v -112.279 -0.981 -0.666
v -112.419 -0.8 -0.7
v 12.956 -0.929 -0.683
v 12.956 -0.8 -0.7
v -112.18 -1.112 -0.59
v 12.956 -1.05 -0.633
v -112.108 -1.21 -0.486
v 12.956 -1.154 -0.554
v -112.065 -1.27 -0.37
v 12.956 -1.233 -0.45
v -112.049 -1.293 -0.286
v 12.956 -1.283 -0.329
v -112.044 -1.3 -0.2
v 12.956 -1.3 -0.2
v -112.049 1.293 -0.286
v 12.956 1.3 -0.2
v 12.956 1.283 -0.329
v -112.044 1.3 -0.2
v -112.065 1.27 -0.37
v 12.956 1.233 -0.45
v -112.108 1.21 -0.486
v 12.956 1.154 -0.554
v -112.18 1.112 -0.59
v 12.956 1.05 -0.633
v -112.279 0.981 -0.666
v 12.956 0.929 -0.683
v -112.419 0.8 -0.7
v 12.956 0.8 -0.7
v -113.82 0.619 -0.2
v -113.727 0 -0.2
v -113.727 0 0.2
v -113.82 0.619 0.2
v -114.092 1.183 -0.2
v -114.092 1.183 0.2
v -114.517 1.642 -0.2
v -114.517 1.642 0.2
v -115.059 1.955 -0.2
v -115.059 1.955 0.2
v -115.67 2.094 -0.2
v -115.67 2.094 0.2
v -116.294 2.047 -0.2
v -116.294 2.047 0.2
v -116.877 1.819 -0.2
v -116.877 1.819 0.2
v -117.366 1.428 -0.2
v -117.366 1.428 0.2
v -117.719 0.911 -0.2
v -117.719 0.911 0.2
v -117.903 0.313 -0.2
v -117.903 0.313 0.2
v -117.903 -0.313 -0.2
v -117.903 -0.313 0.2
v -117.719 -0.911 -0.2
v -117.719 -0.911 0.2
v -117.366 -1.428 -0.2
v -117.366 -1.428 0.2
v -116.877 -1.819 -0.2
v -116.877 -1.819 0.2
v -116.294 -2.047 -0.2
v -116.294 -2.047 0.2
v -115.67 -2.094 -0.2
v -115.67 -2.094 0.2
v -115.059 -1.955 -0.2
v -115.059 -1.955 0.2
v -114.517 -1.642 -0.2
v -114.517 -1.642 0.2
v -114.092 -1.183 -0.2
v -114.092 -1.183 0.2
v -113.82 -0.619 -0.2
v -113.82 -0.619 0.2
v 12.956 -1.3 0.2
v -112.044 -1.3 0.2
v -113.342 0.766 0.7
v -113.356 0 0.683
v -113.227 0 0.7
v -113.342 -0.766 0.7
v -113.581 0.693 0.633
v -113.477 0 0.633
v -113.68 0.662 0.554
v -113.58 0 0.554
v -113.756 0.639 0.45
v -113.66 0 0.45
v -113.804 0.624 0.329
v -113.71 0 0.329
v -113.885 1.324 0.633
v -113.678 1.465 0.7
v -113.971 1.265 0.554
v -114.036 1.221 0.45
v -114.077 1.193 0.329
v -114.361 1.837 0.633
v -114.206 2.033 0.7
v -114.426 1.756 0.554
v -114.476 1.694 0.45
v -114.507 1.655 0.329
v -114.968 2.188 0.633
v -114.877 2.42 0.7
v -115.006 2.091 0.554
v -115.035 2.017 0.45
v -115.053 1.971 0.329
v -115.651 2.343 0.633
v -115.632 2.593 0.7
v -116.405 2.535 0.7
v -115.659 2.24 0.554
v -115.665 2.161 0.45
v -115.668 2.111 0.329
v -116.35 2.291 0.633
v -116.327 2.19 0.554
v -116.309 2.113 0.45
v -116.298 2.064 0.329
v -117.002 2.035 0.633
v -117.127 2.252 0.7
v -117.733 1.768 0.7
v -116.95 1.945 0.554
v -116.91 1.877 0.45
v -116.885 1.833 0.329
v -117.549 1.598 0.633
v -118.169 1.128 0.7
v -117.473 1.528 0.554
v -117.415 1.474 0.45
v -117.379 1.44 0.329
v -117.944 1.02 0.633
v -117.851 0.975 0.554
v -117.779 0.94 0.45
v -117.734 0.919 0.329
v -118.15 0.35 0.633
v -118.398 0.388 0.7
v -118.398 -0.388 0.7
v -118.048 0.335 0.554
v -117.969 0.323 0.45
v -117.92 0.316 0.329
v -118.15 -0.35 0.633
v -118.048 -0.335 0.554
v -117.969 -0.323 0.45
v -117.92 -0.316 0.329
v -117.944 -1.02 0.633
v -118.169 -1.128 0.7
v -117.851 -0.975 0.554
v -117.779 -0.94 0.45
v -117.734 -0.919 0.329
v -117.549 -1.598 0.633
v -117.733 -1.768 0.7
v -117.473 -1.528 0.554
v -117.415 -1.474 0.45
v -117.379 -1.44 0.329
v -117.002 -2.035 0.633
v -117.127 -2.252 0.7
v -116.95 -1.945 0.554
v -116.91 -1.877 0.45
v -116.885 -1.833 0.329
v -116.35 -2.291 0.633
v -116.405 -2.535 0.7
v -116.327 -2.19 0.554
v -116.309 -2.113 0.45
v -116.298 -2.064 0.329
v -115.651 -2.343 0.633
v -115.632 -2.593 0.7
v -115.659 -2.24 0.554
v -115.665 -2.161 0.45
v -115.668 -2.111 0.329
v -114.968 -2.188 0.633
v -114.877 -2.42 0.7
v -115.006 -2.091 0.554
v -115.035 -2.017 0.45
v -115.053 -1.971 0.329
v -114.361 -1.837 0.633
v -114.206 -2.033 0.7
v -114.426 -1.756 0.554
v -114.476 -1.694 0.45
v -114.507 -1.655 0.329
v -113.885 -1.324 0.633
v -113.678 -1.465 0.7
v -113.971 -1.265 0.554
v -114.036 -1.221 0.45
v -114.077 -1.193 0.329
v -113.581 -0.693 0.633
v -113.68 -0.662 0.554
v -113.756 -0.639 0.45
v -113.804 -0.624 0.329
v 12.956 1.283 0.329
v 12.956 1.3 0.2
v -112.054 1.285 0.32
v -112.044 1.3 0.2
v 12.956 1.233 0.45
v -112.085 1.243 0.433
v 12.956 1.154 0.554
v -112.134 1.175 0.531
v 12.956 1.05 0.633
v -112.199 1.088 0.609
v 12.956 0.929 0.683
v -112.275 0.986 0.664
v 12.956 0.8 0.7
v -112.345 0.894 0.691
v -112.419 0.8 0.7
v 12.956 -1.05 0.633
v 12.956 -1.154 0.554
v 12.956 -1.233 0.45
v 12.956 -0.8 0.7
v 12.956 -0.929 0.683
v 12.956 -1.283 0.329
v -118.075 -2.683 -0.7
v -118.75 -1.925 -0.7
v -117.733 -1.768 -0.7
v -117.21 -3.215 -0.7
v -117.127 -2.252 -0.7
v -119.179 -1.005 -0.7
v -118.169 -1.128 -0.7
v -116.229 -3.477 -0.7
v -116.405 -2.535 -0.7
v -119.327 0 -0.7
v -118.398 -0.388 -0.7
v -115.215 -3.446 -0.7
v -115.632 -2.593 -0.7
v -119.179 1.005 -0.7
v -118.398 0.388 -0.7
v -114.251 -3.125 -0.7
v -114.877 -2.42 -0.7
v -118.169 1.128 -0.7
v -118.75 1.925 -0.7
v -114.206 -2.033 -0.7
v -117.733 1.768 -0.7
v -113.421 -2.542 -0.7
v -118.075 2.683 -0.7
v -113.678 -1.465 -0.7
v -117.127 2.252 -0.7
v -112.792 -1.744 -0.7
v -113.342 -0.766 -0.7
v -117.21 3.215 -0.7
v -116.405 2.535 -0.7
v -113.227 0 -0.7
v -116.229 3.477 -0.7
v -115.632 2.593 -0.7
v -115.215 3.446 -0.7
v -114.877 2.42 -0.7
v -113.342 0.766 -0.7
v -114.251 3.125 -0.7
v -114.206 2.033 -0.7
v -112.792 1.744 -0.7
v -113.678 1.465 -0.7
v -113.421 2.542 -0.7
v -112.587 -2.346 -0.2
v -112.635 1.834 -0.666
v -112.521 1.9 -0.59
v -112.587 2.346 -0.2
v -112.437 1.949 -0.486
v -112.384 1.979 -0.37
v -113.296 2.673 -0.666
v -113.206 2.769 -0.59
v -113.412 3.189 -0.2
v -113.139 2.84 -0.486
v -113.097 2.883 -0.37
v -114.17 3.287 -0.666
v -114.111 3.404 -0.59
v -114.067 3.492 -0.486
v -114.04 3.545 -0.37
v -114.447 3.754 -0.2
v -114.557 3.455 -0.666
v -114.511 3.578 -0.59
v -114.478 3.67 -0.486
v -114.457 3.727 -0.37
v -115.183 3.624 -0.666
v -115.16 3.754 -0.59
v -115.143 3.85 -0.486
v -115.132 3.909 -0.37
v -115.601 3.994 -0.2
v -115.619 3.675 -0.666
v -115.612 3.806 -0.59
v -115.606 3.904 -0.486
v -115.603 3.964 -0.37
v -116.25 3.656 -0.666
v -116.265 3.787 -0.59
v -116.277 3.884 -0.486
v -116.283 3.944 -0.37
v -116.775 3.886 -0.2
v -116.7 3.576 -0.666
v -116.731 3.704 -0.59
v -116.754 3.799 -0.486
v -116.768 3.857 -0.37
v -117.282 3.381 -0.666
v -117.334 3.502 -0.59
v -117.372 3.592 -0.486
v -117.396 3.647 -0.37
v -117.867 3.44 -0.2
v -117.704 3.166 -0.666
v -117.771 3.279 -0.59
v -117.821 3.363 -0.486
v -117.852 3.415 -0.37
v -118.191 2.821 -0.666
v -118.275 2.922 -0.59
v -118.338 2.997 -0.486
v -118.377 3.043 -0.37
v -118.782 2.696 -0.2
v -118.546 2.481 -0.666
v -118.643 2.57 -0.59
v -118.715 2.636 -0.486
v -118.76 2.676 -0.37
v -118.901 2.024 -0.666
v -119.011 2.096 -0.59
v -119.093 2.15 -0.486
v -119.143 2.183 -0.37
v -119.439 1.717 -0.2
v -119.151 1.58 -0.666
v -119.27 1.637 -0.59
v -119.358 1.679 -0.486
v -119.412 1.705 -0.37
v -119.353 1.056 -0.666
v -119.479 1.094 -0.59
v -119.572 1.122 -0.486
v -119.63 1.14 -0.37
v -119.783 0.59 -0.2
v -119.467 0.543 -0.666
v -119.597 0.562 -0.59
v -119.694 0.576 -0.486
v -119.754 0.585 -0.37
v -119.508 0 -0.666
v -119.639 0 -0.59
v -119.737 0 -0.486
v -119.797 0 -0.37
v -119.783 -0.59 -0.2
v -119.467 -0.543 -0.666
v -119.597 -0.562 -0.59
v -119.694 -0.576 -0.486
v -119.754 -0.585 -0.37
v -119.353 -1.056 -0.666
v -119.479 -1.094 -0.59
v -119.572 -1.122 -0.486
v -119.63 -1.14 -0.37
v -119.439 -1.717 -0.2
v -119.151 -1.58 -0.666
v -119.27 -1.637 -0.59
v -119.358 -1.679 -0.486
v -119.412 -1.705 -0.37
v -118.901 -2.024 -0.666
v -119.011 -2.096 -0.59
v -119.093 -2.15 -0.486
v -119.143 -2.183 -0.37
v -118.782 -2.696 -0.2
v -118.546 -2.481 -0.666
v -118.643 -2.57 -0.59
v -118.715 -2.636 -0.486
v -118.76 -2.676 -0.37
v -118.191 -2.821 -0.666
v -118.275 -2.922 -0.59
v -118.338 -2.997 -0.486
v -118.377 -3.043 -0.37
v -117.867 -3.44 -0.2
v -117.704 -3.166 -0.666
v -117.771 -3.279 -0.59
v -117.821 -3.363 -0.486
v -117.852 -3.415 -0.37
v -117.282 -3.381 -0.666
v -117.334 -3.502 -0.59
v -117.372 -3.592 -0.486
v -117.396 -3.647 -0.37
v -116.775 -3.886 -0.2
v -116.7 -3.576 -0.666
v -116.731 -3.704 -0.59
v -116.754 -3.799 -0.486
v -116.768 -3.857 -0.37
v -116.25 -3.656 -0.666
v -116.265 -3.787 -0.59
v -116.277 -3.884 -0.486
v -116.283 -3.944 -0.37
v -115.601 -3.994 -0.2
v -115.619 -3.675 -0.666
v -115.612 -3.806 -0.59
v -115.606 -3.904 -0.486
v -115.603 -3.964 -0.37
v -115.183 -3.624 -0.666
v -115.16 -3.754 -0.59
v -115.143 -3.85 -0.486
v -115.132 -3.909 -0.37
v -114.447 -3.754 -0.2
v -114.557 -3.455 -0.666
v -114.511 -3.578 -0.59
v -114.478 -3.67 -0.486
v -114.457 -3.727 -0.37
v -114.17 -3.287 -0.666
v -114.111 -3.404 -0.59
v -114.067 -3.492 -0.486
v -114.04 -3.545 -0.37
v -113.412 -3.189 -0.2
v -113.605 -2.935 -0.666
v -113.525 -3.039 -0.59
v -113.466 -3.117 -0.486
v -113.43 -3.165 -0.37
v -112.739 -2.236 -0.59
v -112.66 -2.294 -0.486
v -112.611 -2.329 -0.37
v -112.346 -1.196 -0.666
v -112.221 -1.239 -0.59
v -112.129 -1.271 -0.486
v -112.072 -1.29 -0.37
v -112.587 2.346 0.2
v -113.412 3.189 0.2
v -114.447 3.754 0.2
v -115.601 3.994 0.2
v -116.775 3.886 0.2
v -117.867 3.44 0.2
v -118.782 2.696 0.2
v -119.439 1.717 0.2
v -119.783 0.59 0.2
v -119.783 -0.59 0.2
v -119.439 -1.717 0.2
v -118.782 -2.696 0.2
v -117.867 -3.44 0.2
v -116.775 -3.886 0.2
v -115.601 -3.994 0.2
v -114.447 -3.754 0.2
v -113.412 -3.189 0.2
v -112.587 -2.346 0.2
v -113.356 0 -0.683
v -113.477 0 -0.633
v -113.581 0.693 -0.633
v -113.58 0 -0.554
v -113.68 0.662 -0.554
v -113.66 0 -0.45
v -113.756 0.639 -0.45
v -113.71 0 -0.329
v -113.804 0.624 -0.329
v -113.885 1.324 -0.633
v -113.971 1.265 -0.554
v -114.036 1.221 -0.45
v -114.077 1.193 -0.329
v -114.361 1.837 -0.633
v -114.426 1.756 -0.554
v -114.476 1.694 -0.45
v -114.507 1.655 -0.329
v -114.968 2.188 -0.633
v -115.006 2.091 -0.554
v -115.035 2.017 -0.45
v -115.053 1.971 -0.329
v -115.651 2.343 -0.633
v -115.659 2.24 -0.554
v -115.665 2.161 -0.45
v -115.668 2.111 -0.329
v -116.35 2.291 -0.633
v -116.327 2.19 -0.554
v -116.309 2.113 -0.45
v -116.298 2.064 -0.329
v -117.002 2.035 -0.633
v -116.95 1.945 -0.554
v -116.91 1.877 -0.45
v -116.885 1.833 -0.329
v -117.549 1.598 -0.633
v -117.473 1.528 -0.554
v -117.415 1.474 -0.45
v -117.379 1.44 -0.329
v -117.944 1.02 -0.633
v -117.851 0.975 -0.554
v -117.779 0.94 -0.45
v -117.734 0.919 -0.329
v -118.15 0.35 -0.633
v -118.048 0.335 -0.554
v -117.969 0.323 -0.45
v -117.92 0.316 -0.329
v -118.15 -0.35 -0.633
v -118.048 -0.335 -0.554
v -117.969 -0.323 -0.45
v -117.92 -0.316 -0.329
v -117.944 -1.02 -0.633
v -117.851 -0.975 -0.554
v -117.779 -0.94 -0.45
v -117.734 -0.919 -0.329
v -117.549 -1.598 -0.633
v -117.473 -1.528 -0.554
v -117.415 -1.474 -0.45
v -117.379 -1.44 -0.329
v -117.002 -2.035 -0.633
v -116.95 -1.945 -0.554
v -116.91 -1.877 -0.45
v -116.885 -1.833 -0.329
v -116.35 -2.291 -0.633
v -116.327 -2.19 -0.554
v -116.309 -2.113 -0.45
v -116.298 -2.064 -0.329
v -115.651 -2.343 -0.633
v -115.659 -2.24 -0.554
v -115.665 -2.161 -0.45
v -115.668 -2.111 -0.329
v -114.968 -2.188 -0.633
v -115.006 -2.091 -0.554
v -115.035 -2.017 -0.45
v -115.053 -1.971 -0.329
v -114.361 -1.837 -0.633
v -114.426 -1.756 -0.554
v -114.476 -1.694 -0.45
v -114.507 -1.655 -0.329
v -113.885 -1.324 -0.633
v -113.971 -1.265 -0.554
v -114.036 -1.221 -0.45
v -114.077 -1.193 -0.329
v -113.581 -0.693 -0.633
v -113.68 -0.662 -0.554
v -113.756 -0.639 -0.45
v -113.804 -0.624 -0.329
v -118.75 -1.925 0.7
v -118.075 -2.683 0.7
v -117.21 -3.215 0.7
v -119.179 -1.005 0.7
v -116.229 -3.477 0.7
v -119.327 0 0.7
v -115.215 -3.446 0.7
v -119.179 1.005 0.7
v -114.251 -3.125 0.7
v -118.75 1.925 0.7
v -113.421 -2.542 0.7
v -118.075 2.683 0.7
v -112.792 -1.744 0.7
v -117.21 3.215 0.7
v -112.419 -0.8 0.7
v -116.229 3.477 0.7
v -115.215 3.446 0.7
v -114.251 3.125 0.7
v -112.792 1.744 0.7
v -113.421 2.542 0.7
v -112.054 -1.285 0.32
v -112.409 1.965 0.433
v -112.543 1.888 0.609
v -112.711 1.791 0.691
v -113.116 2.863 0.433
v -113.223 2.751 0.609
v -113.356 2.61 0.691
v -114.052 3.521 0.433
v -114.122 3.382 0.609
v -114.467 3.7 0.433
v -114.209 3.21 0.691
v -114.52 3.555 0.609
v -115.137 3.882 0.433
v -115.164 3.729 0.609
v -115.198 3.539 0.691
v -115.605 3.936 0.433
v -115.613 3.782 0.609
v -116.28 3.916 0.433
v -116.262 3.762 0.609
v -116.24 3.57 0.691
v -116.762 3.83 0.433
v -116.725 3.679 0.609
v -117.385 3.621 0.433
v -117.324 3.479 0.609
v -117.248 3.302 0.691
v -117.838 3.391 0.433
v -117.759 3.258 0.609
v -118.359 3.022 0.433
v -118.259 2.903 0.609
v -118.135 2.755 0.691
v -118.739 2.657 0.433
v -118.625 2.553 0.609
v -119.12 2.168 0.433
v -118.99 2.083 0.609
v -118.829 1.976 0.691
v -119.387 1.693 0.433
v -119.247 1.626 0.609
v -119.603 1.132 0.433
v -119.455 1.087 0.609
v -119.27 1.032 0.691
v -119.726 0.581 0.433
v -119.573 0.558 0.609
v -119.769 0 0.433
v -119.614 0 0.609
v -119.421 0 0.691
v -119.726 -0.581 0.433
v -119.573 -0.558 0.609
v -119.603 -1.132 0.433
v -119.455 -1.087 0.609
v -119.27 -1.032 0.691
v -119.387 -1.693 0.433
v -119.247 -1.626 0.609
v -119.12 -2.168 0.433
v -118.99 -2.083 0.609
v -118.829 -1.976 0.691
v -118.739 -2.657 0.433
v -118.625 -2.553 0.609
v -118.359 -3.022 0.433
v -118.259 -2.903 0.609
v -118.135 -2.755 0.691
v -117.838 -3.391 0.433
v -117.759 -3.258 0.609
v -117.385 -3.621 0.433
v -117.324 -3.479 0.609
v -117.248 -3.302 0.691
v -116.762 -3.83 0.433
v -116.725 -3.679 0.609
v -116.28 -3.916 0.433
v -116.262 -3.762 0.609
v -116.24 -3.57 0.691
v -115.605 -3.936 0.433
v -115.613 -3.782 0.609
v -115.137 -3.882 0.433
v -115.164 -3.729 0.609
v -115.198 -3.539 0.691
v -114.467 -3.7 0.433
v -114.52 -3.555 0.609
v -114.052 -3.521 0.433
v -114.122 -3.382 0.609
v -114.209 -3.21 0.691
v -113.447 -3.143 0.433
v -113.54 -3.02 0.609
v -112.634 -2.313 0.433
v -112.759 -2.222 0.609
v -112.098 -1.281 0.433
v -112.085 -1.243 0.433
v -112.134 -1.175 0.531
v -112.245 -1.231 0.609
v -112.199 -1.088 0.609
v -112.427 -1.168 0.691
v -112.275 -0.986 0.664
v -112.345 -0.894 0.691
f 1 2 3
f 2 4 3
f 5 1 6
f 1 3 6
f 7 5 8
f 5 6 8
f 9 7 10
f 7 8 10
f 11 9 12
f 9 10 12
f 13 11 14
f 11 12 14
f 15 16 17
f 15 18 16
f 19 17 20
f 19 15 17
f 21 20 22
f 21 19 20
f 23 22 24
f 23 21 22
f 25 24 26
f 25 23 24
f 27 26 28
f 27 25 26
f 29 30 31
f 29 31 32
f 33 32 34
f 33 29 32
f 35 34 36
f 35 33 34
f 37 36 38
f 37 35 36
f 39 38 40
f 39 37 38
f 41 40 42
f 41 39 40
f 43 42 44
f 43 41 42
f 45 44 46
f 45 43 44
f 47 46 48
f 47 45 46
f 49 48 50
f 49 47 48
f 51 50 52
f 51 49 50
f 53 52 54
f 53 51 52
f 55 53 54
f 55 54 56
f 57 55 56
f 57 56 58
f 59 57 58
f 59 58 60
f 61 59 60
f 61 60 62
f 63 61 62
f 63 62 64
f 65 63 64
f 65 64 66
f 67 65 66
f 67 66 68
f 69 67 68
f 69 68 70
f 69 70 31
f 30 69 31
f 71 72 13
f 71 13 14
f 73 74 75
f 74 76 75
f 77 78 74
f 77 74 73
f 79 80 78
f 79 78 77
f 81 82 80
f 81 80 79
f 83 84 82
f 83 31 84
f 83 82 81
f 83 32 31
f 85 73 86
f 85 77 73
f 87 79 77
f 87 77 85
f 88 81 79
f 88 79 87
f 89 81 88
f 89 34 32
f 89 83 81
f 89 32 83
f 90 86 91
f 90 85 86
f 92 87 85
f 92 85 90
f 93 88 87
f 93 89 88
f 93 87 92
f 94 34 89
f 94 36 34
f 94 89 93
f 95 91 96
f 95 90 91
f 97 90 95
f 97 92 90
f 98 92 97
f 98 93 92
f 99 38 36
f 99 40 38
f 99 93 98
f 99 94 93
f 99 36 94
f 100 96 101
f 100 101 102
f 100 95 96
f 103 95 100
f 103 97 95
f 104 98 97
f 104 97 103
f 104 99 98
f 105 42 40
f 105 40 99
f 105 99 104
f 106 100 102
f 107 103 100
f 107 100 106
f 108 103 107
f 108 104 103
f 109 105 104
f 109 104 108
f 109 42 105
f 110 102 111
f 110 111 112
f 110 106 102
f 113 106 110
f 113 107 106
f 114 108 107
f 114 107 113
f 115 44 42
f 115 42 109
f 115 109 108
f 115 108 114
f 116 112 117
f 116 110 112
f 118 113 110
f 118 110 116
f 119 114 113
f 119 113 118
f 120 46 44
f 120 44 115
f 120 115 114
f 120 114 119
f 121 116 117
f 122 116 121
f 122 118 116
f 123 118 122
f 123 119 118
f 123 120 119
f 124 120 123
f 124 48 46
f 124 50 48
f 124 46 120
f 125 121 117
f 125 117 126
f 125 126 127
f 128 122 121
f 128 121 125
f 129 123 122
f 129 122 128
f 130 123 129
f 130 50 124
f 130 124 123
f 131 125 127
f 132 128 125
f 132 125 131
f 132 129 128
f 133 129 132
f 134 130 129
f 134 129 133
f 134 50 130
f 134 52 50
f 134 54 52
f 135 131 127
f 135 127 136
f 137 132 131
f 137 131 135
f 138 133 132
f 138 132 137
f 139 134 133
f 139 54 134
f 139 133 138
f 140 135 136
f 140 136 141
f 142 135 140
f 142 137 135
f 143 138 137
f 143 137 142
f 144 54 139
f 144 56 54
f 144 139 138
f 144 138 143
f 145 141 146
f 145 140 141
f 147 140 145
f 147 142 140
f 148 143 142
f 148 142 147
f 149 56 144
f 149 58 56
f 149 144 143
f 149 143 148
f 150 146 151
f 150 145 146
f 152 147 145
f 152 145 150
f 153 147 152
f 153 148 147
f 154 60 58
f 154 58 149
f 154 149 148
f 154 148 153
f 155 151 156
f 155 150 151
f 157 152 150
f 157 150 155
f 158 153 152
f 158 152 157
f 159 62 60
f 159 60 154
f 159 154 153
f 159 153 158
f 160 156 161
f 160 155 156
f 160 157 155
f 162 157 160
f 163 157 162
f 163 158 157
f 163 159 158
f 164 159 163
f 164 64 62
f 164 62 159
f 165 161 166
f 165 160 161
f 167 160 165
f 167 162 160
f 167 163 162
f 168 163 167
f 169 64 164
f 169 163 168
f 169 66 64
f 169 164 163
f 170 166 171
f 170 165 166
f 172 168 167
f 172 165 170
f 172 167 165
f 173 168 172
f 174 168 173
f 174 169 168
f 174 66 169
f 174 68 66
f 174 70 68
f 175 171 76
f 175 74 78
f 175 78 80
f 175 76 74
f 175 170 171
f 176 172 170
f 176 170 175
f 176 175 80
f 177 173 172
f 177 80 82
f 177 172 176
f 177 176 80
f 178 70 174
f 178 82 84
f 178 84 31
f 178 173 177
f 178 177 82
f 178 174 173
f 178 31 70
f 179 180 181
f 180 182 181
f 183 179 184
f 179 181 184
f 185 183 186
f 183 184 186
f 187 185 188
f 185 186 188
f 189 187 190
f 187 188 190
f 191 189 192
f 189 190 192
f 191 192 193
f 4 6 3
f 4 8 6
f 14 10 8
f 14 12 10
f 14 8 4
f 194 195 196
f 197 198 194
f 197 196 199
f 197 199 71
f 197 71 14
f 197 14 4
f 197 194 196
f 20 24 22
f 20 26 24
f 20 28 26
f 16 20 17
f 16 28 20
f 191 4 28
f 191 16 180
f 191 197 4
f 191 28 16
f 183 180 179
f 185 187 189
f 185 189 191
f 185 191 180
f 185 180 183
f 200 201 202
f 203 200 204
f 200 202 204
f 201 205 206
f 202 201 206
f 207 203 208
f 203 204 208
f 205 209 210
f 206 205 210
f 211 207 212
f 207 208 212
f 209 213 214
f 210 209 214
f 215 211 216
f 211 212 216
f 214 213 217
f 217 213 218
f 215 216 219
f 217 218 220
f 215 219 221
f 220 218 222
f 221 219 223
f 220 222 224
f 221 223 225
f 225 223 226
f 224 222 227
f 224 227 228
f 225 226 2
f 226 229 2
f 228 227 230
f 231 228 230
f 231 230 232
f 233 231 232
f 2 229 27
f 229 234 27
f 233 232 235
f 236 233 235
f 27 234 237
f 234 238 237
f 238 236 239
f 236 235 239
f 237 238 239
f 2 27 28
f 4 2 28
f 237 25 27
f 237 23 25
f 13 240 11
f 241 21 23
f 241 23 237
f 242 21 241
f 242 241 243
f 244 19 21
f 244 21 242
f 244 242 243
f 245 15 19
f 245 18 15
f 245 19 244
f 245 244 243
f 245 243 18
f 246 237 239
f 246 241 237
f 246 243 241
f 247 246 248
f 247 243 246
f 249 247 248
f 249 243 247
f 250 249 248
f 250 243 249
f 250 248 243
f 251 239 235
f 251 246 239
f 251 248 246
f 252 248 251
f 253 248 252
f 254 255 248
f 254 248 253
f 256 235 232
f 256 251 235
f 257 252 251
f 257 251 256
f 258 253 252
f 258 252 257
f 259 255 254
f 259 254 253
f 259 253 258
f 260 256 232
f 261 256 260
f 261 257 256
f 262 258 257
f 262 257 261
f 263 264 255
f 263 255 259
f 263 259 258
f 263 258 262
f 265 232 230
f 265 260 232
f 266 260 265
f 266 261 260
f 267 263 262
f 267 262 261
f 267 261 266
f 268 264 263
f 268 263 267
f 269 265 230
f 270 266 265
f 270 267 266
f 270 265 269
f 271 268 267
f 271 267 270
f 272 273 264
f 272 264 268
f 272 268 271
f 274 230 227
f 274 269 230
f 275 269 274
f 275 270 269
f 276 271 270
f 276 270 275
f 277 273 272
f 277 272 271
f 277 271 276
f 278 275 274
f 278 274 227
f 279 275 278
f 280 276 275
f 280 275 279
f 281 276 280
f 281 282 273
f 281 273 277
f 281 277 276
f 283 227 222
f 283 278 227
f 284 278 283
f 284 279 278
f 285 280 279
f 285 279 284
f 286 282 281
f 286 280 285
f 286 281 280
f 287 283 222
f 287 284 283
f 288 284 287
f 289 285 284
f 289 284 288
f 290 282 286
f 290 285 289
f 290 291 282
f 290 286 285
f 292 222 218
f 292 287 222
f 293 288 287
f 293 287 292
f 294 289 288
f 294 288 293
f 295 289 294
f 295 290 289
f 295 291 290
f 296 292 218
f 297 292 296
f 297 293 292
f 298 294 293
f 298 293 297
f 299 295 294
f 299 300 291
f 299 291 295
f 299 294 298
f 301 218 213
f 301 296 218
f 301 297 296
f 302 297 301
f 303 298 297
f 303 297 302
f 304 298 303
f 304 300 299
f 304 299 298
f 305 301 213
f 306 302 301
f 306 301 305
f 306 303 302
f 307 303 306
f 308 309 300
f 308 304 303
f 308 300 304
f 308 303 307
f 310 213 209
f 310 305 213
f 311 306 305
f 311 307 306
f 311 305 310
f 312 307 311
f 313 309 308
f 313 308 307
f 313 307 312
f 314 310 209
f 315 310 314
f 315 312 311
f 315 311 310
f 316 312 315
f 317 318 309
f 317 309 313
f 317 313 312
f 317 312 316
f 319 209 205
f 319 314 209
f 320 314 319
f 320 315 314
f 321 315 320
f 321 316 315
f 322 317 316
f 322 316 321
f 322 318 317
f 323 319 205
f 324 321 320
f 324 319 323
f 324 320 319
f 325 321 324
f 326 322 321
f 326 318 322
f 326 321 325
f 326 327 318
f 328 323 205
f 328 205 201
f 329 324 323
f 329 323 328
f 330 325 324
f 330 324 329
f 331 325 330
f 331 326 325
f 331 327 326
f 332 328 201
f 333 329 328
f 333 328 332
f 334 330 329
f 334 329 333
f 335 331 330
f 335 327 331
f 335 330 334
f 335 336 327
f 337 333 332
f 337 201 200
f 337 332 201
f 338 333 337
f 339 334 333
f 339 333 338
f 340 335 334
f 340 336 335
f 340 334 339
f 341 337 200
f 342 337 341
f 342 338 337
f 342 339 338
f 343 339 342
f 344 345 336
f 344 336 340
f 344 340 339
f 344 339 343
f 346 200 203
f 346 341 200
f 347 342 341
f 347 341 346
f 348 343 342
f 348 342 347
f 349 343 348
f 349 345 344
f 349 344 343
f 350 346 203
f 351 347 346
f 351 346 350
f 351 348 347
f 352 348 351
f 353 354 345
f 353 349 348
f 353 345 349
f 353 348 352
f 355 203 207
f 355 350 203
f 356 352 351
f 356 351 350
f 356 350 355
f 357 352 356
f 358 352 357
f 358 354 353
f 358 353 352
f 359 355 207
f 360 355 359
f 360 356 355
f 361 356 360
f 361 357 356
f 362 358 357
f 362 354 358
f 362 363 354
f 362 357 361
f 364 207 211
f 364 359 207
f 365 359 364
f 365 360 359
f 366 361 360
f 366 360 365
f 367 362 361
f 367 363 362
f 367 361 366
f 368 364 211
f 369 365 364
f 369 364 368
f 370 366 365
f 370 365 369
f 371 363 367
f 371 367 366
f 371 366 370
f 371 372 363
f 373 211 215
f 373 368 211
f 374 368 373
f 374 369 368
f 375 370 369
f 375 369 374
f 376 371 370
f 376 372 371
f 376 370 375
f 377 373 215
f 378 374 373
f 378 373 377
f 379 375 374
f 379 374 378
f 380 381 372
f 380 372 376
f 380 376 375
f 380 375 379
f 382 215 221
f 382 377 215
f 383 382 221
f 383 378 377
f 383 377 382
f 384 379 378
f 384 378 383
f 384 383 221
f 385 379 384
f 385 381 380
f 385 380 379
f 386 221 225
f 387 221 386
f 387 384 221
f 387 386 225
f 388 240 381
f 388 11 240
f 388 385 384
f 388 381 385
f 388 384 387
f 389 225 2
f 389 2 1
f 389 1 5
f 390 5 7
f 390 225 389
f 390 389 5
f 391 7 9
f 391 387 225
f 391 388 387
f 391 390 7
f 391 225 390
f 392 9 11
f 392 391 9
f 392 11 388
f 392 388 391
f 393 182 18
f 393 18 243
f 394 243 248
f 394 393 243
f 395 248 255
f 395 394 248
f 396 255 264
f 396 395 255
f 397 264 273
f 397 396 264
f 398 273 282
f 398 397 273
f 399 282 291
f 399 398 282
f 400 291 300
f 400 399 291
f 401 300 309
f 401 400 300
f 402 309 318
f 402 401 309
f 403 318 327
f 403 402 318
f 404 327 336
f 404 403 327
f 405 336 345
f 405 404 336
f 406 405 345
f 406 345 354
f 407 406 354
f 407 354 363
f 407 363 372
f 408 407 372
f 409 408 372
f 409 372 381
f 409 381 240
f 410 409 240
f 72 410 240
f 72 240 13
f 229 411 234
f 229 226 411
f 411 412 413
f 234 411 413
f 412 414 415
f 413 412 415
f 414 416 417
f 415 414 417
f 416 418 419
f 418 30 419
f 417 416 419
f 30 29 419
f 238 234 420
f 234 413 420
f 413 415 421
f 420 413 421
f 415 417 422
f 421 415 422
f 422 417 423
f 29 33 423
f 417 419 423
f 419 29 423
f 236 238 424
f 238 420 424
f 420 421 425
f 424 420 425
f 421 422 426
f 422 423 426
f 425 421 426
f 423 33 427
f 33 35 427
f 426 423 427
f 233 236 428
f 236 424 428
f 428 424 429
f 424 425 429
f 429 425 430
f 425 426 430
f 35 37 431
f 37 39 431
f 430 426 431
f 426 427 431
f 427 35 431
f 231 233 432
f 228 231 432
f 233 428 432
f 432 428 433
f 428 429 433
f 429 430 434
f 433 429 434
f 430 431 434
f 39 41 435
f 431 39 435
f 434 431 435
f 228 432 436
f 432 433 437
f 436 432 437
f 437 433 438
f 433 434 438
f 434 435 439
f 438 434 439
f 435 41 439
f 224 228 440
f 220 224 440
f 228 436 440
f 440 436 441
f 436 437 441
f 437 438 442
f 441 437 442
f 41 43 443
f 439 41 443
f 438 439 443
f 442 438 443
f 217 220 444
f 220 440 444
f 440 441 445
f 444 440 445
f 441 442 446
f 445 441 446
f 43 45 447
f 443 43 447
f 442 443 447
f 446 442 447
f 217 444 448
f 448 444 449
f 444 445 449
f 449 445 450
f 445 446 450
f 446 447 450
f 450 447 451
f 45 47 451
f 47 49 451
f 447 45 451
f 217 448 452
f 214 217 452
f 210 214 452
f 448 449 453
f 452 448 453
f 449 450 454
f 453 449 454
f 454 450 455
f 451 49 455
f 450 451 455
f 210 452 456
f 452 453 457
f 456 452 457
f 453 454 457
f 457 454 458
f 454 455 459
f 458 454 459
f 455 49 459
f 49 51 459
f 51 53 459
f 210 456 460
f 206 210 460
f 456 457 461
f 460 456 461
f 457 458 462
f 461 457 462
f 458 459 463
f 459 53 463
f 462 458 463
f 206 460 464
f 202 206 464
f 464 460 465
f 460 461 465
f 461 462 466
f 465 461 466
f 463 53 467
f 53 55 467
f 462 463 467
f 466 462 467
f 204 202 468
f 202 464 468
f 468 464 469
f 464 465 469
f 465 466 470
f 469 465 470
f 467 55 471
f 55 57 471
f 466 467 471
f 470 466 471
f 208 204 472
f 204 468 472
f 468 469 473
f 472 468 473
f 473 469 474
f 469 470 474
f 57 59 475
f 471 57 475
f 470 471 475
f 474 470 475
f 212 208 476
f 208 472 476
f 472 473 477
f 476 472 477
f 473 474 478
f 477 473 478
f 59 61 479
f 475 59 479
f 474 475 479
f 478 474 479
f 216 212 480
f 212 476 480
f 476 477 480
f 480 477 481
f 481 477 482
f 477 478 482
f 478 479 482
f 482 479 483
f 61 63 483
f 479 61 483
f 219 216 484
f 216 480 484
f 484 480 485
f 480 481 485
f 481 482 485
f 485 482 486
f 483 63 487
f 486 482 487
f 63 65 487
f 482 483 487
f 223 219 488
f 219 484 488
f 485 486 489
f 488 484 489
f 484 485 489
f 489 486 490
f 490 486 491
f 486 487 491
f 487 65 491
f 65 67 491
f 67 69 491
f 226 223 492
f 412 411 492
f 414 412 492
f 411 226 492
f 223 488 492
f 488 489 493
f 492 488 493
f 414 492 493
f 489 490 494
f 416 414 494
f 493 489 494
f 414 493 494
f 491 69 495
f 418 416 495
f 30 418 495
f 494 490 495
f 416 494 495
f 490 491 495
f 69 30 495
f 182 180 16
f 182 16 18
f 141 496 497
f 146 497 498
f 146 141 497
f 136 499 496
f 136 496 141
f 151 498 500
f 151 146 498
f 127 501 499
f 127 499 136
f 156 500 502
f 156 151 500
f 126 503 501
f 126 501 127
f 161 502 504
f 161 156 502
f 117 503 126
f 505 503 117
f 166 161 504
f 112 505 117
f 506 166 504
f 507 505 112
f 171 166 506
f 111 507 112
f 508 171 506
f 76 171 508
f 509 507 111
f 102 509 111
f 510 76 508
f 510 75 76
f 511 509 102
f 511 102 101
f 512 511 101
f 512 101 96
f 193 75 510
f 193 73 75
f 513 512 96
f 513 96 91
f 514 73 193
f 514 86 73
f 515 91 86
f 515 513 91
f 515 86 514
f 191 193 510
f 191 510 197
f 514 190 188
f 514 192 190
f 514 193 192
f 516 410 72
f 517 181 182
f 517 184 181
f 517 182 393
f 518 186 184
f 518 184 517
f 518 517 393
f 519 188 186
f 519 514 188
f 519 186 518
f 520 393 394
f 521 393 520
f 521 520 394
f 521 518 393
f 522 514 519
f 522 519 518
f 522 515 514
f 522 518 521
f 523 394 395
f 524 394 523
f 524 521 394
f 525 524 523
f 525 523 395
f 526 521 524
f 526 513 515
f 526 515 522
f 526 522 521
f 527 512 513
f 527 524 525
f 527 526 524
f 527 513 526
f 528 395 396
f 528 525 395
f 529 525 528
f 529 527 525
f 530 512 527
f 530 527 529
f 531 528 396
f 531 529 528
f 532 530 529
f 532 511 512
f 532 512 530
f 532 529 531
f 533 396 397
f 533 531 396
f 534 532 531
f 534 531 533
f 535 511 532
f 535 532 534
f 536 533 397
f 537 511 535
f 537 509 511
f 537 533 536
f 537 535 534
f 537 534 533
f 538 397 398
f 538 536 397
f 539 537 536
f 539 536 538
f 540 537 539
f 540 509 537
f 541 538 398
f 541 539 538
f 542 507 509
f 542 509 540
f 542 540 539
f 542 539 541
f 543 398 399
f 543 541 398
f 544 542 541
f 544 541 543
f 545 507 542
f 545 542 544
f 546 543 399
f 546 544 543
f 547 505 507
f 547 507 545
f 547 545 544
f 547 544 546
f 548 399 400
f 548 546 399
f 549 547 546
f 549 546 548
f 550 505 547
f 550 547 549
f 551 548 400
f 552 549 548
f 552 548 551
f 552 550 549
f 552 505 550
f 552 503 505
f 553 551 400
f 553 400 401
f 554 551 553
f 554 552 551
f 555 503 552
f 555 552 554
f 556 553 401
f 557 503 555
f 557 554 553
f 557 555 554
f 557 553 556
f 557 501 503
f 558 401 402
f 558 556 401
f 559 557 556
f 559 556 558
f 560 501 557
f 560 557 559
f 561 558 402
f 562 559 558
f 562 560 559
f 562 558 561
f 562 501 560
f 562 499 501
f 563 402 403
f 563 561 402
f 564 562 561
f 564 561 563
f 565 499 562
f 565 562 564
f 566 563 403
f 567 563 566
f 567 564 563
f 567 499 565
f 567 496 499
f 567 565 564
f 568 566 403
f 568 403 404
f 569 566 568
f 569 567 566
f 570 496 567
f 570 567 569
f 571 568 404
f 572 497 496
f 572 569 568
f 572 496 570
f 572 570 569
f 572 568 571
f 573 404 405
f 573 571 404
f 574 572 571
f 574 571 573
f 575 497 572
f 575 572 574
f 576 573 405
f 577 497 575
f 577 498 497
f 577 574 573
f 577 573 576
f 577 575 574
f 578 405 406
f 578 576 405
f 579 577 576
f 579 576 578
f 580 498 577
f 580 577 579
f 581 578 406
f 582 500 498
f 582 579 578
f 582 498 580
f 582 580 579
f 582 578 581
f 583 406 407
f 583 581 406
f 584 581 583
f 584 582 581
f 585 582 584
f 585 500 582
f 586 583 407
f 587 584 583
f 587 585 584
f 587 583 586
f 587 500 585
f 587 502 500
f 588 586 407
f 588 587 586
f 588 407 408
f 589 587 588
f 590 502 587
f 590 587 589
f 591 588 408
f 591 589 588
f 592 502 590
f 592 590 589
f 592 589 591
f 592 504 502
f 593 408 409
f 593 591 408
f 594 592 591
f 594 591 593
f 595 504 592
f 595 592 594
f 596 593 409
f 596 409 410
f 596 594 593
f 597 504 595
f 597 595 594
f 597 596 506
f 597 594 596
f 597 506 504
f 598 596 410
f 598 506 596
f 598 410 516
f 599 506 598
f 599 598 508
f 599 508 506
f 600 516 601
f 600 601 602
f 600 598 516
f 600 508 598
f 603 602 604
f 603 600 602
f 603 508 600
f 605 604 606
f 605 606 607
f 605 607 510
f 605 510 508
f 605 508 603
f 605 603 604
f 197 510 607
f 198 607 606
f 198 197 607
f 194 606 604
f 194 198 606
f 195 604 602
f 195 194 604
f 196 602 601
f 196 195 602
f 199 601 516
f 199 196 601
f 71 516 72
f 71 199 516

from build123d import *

# Parameters (mm, degrees)
F0_R     = 2.1
F1_DEPTH = 0.7
F2_DEPTH = 0.7
F3_R     = 0.5


with BuildPart() as f1:
    # F0 (on Top) → F1 (new body, symmetric)
    with BuildSketch(Plane.XY):
        with BuildLine():
            ThreePointArc((-112.043822, -1.3), (-111.881337, -0.659005), (-111.826678, 0))
            ThreePointArc((-111.826678, 0), (-111.881337, 0.659005), (-112.043822, 1.3))
            ThreePointArc((-112.043822, 1.3), (-119.826678, 0), (-112.043822, -1.3))
        make_face()
        with Locations((-115.826678, 0)):
            Circle(F0_R, mode=Mode.SUBTRACT)
    extrude(amount=F1_DEPTH, both=True)

    # F0 (on Top) → F2 (join, symmetric)
    with BuildSketch(Plane.XY):
        with BuildLine():
            ThreePointArc((-112.043822, 1.3), (-111.881337, 0.659005), (-111.826678, 0))
            ThreePointArc((-111.826678, 0), (-111.881337, -0.659005), (-112.043822, -1.3))
            Line((-112.043822, -1.3), (12.956178, -1.3))
            Line((12.956178, -1.3), (12.956178, 0))
            Line((12.956178, 0), (12.956178, 1.3))
            Line((12.956178, 1.3), (-112.043822, 1.3))
        make_face()
    extrude(amount=F2_DEPTH, both=True)

    # F3
    f3_edges = [f1.edges().sort_by_distance(p)[0] for p in [
        (-117.926678, 0, 0.7),
        (-117.926678, 0, -0.7),
        (-119.826678, 0, -0.7),
        (-119.826678, 0, 0.7),
        (-49.543822, 1.3, 0.7),
        (-49.543822, -1.3, 0.7),
        (-49.543822, 1.3, -0.7),
        (-49.543822, -1.3, -0.7),
    ]]
    fillet(f3_edges, radius=F3_R)


solid = f1.part
